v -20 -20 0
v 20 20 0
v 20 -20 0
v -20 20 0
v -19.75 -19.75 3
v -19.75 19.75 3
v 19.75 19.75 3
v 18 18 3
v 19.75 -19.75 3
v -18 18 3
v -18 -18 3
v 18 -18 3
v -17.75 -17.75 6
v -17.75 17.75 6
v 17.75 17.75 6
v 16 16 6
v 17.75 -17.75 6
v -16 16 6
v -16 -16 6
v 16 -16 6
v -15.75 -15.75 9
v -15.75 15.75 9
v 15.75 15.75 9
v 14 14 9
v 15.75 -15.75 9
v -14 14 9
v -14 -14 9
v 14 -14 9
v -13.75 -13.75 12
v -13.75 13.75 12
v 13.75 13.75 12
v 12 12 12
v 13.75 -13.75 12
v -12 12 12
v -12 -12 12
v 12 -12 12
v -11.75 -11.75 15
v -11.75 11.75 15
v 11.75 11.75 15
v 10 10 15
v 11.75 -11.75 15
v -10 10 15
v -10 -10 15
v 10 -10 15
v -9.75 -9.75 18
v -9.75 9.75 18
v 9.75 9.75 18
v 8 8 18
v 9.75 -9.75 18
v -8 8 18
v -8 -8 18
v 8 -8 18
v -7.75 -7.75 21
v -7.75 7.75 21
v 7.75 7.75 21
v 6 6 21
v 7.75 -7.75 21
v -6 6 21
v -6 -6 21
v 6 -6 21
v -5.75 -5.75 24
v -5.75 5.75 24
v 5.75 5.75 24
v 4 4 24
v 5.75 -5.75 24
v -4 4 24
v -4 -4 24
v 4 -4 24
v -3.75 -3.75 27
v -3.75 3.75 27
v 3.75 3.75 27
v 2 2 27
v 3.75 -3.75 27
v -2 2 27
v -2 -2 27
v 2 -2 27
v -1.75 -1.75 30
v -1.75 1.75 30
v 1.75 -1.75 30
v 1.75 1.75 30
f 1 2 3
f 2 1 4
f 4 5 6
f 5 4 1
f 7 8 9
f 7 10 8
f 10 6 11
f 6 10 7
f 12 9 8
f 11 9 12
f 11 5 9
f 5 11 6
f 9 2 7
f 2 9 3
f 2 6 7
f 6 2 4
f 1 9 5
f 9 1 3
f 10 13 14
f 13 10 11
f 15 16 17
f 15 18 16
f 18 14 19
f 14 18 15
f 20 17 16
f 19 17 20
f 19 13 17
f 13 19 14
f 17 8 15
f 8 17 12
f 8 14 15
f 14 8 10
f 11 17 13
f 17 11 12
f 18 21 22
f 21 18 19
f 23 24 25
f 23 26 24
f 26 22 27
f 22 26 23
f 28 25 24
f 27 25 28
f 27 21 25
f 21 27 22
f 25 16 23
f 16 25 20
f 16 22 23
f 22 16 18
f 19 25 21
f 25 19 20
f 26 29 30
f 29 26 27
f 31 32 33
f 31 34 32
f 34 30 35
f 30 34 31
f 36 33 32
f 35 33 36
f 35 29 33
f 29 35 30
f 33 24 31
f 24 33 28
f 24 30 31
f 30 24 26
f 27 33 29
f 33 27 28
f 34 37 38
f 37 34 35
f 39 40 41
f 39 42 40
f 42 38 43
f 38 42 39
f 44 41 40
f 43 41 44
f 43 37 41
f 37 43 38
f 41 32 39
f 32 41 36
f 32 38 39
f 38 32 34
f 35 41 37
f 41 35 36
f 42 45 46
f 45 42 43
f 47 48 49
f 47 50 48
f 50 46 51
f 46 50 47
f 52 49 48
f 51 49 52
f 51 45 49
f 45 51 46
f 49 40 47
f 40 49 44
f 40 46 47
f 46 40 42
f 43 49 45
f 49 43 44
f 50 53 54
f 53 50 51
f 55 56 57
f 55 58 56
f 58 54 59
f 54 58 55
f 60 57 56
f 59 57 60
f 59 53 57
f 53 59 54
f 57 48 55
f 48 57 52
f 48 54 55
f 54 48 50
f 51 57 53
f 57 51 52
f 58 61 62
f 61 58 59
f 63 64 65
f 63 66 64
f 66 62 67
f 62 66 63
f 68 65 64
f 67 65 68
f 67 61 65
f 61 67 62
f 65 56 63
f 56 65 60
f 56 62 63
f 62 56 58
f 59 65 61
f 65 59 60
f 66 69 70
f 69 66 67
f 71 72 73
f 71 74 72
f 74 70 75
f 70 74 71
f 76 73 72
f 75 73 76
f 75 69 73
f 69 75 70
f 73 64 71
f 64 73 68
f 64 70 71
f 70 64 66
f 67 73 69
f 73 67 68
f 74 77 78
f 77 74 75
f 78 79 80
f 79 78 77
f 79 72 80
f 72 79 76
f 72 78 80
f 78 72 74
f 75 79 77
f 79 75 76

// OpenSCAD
// Pyramid with Beveled Brick Layers

// Settings
base_size = 40;       // Base size (bottom)
brick_height = 3;     // Fixed height per brick
num_bricks = 10;      // Number of brick layers
bevel_size = 0.5;     // How much each layer shrinks (creates bevel effect)

height = num_bricks * brick_height; // Total height

// A single brick layer
module brick_layer(size, z) {
    translate([0, 0, z])
        linear_extrude(height=brick_height, scale=(size - bevel_size) / size)
            square([size, size], center=true);
}

// The whole pyramid
module pyramid_with_bevels() {
    for (i = [0:num_bricks-1]) {
        s = base_size - (i * (base_size / num_bricks)); // Shrink at each layer
        brick_layer(s, i * brick_height);
    }
}

pyramid_with_bevels();
